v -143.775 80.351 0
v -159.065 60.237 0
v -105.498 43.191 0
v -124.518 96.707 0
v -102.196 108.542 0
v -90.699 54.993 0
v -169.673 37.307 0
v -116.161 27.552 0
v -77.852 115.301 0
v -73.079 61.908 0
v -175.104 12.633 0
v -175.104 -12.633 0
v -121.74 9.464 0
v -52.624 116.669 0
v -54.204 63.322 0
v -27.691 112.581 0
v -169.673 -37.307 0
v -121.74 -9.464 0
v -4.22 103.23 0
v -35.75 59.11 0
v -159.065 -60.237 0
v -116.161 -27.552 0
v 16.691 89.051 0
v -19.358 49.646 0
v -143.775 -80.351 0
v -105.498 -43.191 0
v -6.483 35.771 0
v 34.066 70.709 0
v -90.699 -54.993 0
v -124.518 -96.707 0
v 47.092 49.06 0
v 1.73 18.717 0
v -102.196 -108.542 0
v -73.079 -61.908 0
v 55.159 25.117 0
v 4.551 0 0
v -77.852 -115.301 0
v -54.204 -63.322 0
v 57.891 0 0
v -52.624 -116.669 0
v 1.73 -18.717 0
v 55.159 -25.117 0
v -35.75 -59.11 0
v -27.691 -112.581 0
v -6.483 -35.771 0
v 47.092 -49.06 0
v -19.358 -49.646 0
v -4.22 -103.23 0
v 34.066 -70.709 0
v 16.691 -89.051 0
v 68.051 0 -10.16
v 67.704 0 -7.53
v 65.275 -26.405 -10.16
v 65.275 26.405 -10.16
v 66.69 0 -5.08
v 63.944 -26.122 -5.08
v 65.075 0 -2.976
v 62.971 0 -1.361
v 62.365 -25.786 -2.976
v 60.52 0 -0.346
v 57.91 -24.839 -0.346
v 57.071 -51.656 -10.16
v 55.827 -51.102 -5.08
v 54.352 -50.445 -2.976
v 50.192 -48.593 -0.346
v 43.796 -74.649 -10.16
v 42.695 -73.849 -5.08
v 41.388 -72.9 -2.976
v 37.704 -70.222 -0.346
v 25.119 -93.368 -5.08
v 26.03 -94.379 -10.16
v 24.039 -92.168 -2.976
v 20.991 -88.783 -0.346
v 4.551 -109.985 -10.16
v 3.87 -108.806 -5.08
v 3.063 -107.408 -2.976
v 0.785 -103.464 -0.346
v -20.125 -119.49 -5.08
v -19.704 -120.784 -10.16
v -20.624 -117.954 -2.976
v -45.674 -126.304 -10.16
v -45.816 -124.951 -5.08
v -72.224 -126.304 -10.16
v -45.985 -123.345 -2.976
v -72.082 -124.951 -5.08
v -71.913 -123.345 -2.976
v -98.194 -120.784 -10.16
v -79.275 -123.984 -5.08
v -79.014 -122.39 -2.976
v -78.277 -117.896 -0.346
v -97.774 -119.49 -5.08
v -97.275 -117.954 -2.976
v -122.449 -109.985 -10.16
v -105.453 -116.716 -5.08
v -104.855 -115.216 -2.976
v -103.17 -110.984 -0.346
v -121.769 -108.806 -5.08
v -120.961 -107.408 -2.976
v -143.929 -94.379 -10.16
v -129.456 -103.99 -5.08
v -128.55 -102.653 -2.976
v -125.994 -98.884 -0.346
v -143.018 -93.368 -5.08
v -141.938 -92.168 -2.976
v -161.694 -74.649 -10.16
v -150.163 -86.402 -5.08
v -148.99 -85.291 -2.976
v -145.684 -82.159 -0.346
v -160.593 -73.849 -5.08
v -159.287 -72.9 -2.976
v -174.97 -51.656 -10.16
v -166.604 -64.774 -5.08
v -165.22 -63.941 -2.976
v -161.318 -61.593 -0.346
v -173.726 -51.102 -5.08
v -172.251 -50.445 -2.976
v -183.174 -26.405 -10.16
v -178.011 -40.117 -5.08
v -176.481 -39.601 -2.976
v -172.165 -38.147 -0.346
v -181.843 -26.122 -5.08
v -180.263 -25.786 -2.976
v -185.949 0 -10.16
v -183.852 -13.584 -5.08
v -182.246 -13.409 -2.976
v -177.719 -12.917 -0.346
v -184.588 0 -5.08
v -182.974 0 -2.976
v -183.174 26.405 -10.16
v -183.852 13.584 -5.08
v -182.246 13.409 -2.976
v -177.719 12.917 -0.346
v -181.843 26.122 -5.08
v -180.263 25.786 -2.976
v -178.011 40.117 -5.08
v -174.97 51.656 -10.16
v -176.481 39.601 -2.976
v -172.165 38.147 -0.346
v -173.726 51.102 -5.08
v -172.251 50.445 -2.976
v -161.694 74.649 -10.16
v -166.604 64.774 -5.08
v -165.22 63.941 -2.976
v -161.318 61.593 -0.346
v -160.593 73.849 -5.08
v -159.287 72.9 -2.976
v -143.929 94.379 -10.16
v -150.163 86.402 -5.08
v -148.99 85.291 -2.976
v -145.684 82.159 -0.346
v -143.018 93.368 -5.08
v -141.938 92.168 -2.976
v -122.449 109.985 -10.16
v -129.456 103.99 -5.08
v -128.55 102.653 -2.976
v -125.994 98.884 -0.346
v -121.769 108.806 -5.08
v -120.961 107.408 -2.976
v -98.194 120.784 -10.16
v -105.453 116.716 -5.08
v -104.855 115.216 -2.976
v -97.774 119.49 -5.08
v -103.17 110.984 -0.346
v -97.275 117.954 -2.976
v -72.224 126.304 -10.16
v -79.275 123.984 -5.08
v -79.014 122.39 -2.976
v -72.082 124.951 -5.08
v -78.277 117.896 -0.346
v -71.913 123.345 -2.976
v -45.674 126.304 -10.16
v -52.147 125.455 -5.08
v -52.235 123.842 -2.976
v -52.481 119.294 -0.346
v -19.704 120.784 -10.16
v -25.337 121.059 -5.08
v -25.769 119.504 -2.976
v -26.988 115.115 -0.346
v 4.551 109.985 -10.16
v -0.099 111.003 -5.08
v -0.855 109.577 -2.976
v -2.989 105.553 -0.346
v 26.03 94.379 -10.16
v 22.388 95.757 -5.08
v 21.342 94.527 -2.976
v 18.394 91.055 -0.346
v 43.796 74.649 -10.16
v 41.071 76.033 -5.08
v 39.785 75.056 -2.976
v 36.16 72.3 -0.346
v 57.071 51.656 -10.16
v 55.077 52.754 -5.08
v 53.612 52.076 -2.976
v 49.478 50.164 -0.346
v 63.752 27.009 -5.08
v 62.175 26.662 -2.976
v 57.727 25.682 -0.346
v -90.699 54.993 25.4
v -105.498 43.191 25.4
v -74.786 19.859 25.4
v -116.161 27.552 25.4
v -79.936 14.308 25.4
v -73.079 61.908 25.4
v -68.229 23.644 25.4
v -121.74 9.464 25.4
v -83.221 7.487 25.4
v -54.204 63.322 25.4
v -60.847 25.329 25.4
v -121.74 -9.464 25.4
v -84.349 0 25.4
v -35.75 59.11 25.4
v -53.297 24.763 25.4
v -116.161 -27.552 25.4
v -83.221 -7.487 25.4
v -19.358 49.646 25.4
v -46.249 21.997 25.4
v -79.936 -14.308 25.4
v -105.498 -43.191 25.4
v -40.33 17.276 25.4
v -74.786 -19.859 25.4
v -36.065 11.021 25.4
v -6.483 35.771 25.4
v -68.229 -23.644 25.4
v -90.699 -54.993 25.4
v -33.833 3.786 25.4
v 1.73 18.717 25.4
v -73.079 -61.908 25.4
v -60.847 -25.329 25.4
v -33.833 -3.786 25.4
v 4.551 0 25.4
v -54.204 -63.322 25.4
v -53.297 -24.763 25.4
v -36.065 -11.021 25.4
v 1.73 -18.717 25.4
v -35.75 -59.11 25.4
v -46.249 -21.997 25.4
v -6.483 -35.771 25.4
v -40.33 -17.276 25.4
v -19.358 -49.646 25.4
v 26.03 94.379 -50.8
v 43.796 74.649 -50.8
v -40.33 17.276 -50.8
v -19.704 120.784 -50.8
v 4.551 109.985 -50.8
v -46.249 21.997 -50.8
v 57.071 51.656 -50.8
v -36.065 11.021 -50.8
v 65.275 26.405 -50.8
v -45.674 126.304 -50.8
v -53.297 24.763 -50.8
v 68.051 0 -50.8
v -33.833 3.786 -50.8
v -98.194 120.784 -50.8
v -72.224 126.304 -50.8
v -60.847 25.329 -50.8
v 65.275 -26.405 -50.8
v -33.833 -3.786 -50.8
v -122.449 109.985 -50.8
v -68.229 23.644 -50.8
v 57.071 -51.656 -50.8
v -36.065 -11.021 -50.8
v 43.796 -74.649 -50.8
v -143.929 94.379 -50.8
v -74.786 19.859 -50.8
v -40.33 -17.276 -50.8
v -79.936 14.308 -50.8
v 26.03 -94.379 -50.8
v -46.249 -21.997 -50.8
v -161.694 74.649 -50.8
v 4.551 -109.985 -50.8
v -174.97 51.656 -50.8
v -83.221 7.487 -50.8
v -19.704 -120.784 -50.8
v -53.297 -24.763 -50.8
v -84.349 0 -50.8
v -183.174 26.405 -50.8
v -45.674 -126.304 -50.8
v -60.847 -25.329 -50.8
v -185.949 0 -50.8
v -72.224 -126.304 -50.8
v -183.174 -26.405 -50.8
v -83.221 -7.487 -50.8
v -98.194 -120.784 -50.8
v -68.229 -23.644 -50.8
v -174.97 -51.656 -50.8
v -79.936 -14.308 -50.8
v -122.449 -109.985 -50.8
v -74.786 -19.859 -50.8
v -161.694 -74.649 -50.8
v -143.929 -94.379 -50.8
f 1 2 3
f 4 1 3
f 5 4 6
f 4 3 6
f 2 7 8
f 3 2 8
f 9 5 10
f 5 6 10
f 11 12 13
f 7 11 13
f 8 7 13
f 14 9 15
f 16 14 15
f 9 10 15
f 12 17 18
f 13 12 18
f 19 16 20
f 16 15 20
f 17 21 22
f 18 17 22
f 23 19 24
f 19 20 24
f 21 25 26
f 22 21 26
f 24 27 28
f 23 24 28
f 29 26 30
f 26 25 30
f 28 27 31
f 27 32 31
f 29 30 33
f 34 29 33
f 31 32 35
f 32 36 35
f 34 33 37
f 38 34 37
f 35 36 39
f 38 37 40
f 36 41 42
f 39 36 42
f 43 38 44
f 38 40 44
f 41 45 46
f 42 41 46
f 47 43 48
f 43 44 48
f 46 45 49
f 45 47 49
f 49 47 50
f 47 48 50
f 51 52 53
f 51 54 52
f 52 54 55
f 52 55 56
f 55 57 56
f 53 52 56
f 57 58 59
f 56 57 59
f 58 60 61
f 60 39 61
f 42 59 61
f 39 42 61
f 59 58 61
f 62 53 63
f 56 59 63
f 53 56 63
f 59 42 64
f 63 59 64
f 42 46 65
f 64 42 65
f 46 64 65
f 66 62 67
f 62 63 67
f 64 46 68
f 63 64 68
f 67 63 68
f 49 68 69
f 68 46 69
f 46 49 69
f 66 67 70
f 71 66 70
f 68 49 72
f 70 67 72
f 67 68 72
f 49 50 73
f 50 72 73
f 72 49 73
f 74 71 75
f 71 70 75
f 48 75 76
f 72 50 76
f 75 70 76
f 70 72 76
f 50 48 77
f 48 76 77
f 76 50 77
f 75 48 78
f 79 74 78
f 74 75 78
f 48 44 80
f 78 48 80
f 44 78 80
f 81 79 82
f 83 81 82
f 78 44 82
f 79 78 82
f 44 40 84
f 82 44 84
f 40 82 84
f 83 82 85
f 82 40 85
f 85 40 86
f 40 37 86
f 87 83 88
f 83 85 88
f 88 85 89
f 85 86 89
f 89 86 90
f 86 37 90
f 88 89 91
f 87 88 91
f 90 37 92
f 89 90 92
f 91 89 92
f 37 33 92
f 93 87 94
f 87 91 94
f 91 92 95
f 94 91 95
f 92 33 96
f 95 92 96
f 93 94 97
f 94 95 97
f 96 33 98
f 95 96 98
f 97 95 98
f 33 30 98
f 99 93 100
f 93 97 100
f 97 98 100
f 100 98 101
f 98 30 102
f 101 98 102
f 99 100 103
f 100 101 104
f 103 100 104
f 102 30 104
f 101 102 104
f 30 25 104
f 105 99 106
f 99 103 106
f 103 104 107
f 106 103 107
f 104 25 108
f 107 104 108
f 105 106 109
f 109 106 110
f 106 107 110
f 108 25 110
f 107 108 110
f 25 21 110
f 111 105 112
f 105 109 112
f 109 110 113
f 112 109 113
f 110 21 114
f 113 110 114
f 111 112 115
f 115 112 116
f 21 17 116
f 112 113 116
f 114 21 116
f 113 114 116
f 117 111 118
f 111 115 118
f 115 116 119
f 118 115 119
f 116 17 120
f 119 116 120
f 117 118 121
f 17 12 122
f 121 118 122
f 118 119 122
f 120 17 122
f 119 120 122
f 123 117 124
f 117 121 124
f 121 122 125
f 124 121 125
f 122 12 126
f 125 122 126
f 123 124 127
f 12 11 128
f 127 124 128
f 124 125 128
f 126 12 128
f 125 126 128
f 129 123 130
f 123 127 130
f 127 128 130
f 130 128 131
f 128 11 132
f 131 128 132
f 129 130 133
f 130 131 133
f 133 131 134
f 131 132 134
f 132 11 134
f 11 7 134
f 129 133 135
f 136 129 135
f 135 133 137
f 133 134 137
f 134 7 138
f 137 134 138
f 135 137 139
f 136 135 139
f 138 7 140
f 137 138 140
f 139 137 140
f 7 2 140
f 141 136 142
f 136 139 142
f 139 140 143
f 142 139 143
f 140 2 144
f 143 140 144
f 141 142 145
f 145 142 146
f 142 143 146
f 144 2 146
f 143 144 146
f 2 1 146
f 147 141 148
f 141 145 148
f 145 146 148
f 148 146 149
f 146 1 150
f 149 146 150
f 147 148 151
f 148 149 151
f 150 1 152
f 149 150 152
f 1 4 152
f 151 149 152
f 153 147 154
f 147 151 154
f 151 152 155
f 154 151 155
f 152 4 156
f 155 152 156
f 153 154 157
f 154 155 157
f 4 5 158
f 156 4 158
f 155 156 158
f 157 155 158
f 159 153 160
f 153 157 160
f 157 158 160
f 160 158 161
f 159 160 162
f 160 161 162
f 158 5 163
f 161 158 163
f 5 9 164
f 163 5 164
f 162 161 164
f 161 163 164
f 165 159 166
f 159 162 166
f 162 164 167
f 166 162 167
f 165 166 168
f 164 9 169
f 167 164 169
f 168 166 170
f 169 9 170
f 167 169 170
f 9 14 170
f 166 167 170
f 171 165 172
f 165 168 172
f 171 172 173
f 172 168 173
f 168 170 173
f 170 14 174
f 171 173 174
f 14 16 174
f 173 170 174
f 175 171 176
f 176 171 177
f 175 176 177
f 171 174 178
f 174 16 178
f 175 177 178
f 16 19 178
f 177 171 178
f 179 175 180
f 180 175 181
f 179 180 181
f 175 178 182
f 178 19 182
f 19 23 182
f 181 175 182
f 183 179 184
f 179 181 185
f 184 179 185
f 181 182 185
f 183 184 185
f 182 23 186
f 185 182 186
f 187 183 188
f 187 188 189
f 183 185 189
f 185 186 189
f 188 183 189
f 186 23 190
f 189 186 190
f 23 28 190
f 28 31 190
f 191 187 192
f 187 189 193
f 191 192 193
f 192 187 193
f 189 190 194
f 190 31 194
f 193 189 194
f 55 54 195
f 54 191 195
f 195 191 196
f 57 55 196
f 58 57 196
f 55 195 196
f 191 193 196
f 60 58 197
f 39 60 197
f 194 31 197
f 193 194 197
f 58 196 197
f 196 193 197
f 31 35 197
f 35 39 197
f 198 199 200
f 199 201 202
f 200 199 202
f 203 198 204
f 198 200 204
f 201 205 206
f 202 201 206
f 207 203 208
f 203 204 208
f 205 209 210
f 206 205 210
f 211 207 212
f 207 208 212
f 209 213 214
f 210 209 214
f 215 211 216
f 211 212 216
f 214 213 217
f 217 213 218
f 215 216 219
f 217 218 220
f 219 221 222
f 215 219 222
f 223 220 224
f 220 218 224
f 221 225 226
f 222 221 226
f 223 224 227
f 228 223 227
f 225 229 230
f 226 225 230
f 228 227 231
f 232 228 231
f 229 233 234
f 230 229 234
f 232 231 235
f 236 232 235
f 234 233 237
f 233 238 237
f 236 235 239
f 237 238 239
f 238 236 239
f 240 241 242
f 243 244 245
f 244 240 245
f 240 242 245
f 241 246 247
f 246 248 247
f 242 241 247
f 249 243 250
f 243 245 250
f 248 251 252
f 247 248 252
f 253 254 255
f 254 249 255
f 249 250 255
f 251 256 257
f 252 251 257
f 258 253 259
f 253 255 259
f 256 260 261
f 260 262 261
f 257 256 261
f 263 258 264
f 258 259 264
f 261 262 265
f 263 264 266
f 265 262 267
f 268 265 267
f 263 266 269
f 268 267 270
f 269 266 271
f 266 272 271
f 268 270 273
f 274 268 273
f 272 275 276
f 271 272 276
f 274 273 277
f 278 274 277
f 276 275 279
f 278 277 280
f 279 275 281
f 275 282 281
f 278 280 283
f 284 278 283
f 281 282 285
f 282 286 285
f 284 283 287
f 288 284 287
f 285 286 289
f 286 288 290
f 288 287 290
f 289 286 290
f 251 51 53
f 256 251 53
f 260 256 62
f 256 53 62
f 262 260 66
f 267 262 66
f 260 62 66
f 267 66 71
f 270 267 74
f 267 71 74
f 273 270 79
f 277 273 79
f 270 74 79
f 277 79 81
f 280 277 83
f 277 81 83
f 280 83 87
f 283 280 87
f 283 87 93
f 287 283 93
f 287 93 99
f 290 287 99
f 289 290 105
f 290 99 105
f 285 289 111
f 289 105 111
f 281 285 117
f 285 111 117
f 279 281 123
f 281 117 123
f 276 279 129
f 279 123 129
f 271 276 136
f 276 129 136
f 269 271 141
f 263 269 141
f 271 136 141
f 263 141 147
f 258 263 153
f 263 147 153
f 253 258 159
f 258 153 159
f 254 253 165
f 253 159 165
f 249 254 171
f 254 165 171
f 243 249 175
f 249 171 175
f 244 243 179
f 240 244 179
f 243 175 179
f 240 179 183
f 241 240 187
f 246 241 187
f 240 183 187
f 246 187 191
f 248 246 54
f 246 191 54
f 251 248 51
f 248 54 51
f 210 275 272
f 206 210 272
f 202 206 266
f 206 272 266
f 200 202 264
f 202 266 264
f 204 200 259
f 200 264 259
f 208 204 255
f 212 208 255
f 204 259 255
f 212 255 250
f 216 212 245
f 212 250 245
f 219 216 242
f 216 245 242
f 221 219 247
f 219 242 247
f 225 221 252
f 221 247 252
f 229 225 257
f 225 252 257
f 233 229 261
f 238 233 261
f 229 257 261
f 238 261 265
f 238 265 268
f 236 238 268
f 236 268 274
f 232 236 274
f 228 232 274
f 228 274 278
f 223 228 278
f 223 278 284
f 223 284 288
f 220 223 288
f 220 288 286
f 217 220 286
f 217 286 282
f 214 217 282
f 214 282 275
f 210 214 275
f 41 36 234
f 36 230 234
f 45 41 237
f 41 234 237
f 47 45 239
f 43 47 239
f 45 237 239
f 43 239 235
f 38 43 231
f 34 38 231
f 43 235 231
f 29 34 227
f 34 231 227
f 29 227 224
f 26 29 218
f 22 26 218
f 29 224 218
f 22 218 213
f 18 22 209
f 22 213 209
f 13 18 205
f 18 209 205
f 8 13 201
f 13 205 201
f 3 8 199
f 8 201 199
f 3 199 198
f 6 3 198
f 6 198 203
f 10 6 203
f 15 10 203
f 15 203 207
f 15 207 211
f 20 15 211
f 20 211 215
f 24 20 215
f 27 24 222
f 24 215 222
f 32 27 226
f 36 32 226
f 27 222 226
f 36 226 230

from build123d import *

# Parameters (mm, degrees)
F3_D = 50.8
F4_R = 10.16


with BuildPart() as f1:
    # F0 (on Front) → F1 (revolve)
    with BuildSketch(Plane.XZ):
        Polygon((-58.9493140578, 25.4), (-58.9493140578, -50.8), (68.0506859422, -50.8), (68.0506859422, 0), (4.5506859422, 0), (4.5506859422, 25.4), align=None)
    revolve(axis=Axis((-58.9493140578, 0, -12.7), (0, 0, -1)))

    # F3 (through all)
    with Locations(Plane.XY.offset(25.4)):
        with Locations((-58.9493140578, 0)):
            Hole(F3_D / 2)

    # F4
    f4_edges = [f1.edges().sort_by_distance(p)[0] for p in [
        (-185.949314, 0, 0),
    ]]
    fillet(f4_edges, radius=F4_R)


solid = f1.part
